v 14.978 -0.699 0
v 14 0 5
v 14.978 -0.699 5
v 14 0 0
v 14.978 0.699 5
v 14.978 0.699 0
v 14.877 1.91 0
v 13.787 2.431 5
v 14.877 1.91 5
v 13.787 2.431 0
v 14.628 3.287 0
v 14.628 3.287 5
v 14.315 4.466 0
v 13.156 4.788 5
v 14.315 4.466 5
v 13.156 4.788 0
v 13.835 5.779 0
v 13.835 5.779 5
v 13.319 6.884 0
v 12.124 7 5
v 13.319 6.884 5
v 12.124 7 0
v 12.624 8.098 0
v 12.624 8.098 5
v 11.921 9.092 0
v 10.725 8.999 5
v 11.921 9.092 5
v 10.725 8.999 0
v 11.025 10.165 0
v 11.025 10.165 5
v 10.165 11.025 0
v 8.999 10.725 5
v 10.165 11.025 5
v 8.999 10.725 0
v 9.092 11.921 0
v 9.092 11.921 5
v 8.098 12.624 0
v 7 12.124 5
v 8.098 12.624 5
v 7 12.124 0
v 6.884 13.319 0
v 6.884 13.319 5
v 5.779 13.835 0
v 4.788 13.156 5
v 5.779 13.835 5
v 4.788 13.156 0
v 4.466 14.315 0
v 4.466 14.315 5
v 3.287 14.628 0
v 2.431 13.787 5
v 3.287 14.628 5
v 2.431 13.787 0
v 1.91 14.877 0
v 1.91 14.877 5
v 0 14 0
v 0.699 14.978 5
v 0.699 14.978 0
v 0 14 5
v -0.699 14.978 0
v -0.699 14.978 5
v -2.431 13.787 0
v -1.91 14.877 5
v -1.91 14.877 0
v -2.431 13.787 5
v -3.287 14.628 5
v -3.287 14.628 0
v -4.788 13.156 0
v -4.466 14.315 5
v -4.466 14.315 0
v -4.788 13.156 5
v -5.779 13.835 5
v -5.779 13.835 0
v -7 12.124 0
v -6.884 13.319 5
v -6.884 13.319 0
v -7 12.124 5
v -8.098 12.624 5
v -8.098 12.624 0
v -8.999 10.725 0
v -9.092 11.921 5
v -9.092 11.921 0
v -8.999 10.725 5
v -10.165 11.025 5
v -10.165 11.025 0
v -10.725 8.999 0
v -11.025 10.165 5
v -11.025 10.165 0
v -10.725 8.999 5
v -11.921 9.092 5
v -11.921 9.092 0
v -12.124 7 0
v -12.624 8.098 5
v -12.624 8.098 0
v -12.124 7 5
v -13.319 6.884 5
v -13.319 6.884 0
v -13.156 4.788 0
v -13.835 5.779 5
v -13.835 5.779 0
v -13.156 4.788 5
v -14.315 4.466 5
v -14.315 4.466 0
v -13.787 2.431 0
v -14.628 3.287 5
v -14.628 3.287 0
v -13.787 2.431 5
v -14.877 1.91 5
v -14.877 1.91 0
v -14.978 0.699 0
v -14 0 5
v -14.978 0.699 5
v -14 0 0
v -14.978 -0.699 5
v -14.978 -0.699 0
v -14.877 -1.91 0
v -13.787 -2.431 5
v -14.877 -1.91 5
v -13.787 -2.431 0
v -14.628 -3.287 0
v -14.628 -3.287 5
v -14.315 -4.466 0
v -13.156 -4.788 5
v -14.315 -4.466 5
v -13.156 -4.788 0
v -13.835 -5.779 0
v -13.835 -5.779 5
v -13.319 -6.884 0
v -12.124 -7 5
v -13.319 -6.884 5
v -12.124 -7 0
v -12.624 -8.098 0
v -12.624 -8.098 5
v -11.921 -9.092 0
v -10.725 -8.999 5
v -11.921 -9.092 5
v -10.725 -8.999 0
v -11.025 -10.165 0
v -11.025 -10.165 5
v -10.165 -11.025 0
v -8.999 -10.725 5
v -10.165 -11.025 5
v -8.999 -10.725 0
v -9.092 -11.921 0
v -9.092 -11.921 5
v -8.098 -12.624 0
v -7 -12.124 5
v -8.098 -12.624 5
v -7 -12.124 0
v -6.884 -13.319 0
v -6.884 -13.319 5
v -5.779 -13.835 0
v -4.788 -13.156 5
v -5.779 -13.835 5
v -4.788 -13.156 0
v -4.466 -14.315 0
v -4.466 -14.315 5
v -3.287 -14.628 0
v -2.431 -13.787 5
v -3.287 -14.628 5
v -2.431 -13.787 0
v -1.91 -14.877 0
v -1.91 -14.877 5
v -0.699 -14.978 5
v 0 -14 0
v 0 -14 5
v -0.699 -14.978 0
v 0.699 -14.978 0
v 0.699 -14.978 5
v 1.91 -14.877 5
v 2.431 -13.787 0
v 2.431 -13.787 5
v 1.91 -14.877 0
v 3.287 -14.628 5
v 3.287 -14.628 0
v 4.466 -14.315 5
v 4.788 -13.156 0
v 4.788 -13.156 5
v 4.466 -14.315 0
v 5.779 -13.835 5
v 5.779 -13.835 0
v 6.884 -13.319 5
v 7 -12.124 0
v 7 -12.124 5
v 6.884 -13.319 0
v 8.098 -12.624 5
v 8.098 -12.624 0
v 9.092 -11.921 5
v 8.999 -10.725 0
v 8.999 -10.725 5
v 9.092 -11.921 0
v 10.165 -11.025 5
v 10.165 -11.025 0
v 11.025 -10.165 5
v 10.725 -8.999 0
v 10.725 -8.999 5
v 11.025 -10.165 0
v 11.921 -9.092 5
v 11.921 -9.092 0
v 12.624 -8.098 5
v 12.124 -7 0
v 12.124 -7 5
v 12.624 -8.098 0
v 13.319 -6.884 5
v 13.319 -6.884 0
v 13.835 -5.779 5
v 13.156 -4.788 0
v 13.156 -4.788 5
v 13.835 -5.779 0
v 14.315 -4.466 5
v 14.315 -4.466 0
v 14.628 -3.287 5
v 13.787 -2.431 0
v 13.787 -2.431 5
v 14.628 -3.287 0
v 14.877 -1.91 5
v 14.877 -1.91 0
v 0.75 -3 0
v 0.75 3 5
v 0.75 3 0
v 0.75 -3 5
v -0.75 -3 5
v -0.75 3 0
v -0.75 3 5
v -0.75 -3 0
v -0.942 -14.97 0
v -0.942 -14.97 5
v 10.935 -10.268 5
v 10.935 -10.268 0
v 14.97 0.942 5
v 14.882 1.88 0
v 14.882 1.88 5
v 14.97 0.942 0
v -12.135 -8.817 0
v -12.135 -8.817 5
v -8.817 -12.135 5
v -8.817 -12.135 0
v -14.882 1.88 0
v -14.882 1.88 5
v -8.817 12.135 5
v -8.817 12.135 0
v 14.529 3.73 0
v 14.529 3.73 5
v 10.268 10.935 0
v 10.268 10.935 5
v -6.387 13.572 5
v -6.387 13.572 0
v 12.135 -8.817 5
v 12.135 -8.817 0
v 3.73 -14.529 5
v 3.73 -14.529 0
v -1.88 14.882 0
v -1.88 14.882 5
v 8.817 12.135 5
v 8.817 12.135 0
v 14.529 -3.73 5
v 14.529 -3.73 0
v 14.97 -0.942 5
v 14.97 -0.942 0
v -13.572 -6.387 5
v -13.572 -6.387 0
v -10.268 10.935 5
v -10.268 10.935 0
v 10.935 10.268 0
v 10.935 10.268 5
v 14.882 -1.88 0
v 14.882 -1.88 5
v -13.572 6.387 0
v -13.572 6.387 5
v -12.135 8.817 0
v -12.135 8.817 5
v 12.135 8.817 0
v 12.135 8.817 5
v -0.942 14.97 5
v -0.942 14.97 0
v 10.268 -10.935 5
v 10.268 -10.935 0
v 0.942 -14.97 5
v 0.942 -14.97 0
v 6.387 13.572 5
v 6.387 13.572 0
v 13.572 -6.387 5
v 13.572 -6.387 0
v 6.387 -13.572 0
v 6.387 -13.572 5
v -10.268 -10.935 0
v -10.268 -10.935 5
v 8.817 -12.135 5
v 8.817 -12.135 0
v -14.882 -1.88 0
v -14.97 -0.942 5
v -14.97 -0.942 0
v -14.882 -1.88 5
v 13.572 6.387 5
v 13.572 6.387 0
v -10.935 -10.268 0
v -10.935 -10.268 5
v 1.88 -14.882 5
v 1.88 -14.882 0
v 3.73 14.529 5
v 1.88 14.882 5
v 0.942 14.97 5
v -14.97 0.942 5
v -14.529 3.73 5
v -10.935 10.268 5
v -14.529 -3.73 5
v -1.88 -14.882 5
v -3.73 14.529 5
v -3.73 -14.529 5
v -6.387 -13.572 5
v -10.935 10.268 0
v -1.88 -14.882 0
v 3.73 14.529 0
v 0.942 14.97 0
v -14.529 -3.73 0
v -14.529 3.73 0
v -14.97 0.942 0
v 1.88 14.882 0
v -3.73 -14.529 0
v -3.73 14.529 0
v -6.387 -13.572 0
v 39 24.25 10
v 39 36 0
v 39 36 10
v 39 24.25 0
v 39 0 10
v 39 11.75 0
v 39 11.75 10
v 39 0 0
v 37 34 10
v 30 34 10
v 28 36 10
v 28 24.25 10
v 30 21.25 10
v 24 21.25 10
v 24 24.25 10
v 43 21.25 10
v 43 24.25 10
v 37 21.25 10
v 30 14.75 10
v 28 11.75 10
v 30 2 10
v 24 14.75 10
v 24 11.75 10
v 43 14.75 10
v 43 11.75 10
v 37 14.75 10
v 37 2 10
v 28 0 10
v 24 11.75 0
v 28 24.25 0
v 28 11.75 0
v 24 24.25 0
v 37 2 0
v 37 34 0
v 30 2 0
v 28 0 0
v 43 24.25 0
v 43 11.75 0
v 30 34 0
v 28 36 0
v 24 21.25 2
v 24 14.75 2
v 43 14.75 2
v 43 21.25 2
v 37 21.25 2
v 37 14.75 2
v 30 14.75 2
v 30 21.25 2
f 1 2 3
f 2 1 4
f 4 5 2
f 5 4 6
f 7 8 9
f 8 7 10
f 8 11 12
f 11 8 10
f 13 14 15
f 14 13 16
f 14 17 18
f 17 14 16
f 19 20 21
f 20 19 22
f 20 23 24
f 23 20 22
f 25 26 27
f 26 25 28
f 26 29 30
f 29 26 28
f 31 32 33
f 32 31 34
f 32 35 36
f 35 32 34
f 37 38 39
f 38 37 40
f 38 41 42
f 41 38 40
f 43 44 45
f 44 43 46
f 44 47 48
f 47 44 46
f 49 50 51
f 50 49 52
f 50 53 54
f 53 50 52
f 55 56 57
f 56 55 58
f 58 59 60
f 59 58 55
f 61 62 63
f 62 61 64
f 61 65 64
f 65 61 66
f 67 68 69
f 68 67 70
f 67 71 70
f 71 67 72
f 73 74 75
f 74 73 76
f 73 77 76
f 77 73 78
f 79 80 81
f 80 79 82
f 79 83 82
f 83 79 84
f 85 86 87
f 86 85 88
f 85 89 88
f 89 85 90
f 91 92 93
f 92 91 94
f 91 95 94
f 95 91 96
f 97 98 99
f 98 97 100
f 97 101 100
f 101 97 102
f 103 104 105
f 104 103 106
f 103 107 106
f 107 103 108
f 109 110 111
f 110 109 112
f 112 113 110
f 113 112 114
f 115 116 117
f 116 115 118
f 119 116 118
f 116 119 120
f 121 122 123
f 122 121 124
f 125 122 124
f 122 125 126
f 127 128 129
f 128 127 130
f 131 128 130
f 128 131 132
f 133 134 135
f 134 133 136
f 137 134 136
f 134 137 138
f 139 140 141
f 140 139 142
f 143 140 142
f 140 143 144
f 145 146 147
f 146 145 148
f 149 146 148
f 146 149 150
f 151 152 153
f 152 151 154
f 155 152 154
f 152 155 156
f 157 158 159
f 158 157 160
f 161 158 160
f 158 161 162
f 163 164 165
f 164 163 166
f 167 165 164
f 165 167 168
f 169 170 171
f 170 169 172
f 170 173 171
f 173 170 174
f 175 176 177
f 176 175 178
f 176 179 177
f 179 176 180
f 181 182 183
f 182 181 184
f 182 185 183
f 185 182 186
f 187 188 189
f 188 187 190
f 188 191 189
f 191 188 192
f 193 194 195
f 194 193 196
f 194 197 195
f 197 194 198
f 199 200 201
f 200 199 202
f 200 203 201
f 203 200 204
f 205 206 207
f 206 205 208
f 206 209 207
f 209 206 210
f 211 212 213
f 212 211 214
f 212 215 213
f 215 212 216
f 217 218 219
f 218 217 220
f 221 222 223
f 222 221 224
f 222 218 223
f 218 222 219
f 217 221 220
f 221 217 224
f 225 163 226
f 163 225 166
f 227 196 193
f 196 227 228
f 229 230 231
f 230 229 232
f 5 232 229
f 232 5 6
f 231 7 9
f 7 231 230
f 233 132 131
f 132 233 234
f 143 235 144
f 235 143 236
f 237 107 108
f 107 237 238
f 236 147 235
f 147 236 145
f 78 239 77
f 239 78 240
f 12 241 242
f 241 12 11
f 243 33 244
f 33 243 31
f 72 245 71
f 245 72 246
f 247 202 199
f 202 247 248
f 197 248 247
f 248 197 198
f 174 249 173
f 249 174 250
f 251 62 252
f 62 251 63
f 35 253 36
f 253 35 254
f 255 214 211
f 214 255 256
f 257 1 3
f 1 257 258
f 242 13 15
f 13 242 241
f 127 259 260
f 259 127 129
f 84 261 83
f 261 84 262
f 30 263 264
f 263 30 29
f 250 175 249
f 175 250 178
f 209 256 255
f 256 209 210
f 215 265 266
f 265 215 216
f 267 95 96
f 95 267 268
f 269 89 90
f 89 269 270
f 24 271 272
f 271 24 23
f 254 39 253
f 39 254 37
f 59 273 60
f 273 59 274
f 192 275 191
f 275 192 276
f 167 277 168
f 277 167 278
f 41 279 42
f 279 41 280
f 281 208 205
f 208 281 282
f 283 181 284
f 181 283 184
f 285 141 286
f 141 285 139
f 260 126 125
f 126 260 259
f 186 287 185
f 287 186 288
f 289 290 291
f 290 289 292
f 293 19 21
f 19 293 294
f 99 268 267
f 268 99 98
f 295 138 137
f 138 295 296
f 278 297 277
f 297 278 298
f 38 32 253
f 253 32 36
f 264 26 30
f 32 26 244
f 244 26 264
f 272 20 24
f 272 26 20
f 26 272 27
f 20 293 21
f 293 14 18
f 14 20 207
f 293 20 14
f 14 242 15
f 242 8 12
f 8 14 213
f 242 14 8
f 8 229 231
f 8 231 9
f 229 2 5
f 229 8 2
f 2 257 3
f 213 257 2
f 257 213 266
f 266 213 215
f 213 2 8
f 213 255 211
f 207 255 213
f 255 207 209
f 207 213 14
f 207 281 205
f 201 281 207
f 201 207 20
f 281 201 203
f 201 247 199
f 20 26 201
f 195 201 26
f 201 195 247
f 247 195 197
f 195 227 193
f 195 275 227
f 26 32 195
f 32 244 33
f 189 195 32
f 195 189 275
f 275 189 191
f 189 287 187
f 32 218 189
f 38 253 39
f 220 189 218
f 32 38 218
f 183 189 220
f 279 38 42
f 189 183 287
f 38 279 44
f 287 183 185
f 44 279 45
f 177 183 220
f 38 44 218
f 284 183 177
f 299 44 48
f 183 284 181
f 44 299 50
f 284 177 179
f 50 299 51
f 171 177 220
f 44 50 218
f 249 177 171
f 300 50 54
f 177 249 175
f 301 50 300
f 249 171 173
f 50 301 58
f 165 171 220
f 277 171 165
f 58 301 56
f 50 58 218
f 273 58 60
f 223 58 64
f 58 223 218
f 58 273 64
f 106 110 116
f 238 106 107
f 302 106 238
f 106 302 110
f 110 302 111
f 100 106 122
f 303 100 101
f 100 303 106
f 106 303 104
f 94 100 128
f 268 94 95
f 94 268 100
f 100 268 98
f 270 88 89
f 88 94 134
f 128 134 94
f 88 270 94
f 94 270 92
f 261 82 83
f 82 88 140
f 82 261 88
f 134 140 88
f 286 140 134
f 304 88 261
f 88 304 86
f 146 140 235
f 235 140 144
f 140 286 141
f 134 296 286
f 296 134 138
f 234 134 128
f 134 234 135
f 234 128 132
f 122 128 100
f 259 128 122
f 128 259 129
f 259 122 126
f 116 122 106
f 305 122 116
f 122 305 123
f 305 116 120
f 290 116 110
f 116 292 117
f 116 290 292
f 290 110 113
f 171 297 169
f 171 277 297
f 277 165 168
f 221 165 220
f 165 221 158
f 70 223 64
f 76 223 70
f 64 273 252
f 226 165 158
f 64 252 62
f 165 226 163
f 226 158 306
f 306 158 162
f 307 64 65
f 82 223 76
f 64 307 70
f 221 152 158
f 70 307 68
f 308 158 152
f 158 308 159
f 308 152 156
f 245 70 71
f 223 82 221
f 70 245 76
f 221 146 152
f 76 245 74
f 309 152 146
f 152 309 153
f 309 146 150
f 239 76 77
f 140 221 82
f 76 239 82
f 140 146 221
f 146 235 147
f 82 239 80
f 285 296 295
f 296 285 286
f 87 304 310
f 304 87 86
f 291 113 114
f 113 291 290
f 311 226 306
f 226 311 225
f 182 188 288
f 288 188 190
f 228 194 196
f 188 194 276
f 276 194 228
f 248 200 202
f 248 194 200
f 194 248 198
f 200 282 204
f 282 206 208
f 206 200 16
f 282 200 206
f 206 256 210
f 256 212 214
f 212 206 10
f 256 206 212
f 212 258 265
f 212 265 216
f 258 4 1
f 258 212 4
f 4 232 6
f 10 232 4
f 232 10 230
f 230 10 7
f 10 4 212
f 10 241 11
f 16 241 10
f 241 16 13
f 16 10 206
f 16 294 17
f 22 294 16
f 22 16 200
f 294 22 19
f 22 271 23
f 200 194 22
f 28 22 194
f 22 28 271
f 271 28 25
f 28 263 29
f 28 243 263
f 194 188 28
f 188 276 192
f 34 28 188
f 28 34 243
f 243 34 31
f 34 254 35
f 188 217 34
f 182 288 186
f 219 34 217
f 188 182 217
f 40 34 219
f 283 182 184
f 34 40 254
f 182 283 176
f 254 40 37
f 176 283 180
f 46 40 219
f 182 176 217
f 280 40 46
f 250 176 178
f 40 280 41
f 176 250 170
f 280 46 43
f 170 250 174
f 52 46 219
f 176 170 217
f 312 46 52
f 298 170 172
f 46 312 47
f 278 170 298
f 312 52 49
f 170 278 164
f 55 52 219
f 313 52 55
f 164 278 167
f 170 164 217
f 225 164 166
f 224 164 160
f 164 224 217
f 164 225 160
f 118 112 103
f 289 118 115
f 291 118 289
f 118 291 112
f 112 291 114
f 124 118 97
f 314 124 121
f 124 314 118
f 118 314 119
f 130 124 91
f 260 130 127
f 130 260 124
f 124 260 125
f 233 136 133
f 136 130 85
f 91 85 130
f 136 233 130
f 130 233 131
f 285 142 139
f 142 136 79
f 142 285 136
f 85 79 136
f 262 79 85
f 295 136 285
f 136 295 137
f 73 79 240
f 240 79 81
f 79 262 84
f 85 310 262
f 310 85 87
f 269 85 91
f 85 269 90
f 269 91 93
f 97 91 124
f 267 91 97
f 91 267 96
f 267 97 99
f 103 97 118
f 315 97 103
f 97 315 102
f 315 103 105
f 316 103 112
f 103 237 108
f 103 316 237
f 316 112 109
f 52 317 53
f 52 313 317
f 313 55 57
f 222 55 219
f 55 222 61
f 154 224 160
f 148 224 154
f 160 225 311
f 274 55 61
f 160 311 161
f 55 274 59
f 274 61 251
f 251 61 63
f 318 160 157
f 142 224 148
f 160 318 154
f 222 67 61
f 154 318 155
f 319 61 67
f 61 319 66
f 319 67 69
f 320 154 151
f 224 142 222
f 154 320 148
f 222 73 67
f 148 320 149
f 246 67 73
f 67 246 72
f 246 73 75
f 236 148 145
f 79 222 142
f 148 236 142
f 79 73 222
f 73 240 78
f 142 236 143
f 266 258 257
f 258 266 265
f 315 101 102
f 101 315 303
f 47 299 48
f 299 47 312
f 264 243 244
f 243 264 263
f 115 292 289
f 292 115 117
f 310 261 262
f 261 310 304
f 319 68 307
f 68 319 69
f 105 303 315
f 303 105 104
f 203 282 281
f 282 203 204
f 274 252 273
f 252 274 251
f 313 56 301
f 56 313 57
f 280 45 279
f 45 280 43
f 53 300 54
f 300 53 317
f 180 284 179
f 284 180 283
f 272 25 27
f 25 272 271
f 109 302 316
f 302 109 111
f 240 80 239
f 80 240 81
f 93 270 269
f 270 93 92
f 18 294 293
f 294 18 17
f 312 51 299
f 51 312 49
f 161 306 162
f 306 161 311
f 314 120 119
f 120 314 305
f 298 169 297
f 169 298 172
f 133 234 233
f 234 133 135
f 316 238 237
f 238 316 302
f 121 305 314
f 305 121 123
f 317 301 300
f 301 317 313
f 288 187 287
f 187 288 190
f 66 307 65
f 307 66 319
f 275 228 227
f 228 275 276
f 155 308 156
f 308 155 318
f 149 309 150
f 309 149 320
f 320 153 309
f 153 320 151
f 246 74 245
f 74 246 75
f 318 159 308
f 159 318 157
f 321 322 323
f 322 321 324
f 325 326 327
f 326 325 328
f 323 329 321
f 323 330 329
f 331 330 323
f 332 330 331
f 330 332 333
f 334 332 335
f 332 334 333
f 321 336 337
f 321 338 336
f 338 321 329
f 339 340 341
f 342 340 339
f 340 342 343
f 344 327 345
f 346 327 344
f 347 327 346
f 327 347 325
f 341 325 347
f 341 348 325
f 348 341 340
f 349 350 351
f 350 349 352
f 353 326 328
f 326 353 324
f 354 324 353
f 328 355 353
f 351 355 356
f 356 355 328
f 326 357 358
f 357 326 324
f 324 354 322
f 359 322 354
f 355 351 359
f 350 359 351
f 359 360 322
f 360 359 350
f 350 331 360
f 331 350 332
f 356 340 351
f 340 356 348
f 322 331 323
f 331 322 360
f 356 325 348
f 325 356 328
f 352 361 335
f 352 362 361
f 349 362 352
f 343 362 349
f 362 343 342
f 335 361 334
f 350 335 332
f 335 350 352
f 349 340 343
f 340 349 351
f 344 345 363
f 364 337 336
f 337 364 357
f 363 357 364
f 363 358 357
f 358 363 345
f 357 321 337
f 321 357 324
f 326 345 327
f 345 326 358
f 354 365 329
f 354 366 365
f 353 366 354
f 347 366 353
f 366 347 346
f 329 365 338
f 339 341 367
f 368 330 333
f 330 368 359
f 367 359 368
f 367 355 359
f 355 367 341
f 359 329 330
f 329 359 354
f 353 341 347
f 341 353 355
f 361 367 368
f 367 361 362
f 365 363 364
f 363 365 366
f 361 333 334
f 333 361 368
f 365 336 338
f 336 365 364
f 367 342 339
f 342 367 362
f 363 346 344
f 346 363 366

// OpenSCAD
// An assembly to adjust a pair of potentiometers using a thumbwheel. This is
// designed to be embedded in a housing of some sort, so the housing is
// minimal and just holds everything together. A thin piece of sheet metal
// (1mm or so) is used ans an axle, post are used as bearings.

// Designed for standart small 10KOhm pots, such as uxcell a14052600ux1117
// with the body of 7x6.5x4mm and three terminals.

// Keep in mind that pots rotate in opposite directions when the thumbwheel
// is turned, so hthey need to be wired differently.

// pot_wheel builds the wheel, pot_housing builds the housing. Set do_build
// to 0 to see the wheel positioned in the base, set to 1 for getenrating
// build file.

// By Nenad Rijavec
// Feel free to use and modify as you see fit.

do_build = 1 ;
wheel_w = 5 ;
wheel_d = 30 ;
pot_l = 6.5 ;
pot_h = 8 ;
pot_thickness = 11 ;
housing_wall = 2 ;
housing_h = pot_h + housing_wall ;
housing_w = wheel_w + 2 + 2*housing_wall ;
housing_l = wheel_d + 2 + 2*housing_wall ;

module pot_wheel()
{
	difference() {
		cylinder( wheel_w, d=wheel_d, $fn=100 ) ;
		translate( [ 0, 0, -1 ] )
		union() {
			// slot for the axle
			translate( [ -0.75, -3, 0 ] ) 
				cube( [ 1.5, 6, wheel_w+2 ] ) ;
			// wheel perimeter structure for betetr grip
			for ( i=[ 0:35 ] ) {
				rotate( [ 0, 0, 10*i ] )
				translate( [ -1.00+wheel_d/2, 0, 0 ] )
				linear_extrude( height = wheel_w + 2 ) 
				polygon( points=[ [ 0, 0 ], 
						[ 1.4, -1.0 ],
						[ 1.4, 1.0 ] ] );
			}
		}
	}
}

module pot_housing()
{
	difference() {
		union() {
			cube( [ housing_w, housing_l, housing_h ] ) ;
			translate( [ -4, (housing_l-pot_l)/2-3, 0 ] )
					cube( [ 4, 6+pot_l, housing_h ] ) ;
			translate( [ housing_w, (housing_l-pot_l)/2-3, 0 ] )
					cube( [ 4, 6+pot_l, housing_h ] ) ;
		}
		union() {
			translate( [ housing_wall, housing_wall,
			-1 ] ) 
			cube( [ housing_w-2*housing_wall,
				housing_l - 2 * housing_wall,
				housing_h+2 ] ) ;
			translate( [ -housing_w-1,
				(housing_l-pot_l)/2,
			 	housing_wall ] )
					cube( [ housing_w +
					2*pot_thickness+2,
						pot_l,
						housing_h ] ) ;
		}
	}
}

if( do_build ) {
	pot_wheel() ;
	translate( [ 13+wheel_d/2, 0, 0 ] )
	pot_housing() ;
} else {
	translate( [ -1, housing_l/2, housing_wall+pot_h/2 ] )
		rotate( [ 0, 90, 0 ] )
		pot_wheel() ;
	translate( [ 1.5-housing_w/2, 0, 0 ] ) pot_housing() ;
}


// nenad me fecit
